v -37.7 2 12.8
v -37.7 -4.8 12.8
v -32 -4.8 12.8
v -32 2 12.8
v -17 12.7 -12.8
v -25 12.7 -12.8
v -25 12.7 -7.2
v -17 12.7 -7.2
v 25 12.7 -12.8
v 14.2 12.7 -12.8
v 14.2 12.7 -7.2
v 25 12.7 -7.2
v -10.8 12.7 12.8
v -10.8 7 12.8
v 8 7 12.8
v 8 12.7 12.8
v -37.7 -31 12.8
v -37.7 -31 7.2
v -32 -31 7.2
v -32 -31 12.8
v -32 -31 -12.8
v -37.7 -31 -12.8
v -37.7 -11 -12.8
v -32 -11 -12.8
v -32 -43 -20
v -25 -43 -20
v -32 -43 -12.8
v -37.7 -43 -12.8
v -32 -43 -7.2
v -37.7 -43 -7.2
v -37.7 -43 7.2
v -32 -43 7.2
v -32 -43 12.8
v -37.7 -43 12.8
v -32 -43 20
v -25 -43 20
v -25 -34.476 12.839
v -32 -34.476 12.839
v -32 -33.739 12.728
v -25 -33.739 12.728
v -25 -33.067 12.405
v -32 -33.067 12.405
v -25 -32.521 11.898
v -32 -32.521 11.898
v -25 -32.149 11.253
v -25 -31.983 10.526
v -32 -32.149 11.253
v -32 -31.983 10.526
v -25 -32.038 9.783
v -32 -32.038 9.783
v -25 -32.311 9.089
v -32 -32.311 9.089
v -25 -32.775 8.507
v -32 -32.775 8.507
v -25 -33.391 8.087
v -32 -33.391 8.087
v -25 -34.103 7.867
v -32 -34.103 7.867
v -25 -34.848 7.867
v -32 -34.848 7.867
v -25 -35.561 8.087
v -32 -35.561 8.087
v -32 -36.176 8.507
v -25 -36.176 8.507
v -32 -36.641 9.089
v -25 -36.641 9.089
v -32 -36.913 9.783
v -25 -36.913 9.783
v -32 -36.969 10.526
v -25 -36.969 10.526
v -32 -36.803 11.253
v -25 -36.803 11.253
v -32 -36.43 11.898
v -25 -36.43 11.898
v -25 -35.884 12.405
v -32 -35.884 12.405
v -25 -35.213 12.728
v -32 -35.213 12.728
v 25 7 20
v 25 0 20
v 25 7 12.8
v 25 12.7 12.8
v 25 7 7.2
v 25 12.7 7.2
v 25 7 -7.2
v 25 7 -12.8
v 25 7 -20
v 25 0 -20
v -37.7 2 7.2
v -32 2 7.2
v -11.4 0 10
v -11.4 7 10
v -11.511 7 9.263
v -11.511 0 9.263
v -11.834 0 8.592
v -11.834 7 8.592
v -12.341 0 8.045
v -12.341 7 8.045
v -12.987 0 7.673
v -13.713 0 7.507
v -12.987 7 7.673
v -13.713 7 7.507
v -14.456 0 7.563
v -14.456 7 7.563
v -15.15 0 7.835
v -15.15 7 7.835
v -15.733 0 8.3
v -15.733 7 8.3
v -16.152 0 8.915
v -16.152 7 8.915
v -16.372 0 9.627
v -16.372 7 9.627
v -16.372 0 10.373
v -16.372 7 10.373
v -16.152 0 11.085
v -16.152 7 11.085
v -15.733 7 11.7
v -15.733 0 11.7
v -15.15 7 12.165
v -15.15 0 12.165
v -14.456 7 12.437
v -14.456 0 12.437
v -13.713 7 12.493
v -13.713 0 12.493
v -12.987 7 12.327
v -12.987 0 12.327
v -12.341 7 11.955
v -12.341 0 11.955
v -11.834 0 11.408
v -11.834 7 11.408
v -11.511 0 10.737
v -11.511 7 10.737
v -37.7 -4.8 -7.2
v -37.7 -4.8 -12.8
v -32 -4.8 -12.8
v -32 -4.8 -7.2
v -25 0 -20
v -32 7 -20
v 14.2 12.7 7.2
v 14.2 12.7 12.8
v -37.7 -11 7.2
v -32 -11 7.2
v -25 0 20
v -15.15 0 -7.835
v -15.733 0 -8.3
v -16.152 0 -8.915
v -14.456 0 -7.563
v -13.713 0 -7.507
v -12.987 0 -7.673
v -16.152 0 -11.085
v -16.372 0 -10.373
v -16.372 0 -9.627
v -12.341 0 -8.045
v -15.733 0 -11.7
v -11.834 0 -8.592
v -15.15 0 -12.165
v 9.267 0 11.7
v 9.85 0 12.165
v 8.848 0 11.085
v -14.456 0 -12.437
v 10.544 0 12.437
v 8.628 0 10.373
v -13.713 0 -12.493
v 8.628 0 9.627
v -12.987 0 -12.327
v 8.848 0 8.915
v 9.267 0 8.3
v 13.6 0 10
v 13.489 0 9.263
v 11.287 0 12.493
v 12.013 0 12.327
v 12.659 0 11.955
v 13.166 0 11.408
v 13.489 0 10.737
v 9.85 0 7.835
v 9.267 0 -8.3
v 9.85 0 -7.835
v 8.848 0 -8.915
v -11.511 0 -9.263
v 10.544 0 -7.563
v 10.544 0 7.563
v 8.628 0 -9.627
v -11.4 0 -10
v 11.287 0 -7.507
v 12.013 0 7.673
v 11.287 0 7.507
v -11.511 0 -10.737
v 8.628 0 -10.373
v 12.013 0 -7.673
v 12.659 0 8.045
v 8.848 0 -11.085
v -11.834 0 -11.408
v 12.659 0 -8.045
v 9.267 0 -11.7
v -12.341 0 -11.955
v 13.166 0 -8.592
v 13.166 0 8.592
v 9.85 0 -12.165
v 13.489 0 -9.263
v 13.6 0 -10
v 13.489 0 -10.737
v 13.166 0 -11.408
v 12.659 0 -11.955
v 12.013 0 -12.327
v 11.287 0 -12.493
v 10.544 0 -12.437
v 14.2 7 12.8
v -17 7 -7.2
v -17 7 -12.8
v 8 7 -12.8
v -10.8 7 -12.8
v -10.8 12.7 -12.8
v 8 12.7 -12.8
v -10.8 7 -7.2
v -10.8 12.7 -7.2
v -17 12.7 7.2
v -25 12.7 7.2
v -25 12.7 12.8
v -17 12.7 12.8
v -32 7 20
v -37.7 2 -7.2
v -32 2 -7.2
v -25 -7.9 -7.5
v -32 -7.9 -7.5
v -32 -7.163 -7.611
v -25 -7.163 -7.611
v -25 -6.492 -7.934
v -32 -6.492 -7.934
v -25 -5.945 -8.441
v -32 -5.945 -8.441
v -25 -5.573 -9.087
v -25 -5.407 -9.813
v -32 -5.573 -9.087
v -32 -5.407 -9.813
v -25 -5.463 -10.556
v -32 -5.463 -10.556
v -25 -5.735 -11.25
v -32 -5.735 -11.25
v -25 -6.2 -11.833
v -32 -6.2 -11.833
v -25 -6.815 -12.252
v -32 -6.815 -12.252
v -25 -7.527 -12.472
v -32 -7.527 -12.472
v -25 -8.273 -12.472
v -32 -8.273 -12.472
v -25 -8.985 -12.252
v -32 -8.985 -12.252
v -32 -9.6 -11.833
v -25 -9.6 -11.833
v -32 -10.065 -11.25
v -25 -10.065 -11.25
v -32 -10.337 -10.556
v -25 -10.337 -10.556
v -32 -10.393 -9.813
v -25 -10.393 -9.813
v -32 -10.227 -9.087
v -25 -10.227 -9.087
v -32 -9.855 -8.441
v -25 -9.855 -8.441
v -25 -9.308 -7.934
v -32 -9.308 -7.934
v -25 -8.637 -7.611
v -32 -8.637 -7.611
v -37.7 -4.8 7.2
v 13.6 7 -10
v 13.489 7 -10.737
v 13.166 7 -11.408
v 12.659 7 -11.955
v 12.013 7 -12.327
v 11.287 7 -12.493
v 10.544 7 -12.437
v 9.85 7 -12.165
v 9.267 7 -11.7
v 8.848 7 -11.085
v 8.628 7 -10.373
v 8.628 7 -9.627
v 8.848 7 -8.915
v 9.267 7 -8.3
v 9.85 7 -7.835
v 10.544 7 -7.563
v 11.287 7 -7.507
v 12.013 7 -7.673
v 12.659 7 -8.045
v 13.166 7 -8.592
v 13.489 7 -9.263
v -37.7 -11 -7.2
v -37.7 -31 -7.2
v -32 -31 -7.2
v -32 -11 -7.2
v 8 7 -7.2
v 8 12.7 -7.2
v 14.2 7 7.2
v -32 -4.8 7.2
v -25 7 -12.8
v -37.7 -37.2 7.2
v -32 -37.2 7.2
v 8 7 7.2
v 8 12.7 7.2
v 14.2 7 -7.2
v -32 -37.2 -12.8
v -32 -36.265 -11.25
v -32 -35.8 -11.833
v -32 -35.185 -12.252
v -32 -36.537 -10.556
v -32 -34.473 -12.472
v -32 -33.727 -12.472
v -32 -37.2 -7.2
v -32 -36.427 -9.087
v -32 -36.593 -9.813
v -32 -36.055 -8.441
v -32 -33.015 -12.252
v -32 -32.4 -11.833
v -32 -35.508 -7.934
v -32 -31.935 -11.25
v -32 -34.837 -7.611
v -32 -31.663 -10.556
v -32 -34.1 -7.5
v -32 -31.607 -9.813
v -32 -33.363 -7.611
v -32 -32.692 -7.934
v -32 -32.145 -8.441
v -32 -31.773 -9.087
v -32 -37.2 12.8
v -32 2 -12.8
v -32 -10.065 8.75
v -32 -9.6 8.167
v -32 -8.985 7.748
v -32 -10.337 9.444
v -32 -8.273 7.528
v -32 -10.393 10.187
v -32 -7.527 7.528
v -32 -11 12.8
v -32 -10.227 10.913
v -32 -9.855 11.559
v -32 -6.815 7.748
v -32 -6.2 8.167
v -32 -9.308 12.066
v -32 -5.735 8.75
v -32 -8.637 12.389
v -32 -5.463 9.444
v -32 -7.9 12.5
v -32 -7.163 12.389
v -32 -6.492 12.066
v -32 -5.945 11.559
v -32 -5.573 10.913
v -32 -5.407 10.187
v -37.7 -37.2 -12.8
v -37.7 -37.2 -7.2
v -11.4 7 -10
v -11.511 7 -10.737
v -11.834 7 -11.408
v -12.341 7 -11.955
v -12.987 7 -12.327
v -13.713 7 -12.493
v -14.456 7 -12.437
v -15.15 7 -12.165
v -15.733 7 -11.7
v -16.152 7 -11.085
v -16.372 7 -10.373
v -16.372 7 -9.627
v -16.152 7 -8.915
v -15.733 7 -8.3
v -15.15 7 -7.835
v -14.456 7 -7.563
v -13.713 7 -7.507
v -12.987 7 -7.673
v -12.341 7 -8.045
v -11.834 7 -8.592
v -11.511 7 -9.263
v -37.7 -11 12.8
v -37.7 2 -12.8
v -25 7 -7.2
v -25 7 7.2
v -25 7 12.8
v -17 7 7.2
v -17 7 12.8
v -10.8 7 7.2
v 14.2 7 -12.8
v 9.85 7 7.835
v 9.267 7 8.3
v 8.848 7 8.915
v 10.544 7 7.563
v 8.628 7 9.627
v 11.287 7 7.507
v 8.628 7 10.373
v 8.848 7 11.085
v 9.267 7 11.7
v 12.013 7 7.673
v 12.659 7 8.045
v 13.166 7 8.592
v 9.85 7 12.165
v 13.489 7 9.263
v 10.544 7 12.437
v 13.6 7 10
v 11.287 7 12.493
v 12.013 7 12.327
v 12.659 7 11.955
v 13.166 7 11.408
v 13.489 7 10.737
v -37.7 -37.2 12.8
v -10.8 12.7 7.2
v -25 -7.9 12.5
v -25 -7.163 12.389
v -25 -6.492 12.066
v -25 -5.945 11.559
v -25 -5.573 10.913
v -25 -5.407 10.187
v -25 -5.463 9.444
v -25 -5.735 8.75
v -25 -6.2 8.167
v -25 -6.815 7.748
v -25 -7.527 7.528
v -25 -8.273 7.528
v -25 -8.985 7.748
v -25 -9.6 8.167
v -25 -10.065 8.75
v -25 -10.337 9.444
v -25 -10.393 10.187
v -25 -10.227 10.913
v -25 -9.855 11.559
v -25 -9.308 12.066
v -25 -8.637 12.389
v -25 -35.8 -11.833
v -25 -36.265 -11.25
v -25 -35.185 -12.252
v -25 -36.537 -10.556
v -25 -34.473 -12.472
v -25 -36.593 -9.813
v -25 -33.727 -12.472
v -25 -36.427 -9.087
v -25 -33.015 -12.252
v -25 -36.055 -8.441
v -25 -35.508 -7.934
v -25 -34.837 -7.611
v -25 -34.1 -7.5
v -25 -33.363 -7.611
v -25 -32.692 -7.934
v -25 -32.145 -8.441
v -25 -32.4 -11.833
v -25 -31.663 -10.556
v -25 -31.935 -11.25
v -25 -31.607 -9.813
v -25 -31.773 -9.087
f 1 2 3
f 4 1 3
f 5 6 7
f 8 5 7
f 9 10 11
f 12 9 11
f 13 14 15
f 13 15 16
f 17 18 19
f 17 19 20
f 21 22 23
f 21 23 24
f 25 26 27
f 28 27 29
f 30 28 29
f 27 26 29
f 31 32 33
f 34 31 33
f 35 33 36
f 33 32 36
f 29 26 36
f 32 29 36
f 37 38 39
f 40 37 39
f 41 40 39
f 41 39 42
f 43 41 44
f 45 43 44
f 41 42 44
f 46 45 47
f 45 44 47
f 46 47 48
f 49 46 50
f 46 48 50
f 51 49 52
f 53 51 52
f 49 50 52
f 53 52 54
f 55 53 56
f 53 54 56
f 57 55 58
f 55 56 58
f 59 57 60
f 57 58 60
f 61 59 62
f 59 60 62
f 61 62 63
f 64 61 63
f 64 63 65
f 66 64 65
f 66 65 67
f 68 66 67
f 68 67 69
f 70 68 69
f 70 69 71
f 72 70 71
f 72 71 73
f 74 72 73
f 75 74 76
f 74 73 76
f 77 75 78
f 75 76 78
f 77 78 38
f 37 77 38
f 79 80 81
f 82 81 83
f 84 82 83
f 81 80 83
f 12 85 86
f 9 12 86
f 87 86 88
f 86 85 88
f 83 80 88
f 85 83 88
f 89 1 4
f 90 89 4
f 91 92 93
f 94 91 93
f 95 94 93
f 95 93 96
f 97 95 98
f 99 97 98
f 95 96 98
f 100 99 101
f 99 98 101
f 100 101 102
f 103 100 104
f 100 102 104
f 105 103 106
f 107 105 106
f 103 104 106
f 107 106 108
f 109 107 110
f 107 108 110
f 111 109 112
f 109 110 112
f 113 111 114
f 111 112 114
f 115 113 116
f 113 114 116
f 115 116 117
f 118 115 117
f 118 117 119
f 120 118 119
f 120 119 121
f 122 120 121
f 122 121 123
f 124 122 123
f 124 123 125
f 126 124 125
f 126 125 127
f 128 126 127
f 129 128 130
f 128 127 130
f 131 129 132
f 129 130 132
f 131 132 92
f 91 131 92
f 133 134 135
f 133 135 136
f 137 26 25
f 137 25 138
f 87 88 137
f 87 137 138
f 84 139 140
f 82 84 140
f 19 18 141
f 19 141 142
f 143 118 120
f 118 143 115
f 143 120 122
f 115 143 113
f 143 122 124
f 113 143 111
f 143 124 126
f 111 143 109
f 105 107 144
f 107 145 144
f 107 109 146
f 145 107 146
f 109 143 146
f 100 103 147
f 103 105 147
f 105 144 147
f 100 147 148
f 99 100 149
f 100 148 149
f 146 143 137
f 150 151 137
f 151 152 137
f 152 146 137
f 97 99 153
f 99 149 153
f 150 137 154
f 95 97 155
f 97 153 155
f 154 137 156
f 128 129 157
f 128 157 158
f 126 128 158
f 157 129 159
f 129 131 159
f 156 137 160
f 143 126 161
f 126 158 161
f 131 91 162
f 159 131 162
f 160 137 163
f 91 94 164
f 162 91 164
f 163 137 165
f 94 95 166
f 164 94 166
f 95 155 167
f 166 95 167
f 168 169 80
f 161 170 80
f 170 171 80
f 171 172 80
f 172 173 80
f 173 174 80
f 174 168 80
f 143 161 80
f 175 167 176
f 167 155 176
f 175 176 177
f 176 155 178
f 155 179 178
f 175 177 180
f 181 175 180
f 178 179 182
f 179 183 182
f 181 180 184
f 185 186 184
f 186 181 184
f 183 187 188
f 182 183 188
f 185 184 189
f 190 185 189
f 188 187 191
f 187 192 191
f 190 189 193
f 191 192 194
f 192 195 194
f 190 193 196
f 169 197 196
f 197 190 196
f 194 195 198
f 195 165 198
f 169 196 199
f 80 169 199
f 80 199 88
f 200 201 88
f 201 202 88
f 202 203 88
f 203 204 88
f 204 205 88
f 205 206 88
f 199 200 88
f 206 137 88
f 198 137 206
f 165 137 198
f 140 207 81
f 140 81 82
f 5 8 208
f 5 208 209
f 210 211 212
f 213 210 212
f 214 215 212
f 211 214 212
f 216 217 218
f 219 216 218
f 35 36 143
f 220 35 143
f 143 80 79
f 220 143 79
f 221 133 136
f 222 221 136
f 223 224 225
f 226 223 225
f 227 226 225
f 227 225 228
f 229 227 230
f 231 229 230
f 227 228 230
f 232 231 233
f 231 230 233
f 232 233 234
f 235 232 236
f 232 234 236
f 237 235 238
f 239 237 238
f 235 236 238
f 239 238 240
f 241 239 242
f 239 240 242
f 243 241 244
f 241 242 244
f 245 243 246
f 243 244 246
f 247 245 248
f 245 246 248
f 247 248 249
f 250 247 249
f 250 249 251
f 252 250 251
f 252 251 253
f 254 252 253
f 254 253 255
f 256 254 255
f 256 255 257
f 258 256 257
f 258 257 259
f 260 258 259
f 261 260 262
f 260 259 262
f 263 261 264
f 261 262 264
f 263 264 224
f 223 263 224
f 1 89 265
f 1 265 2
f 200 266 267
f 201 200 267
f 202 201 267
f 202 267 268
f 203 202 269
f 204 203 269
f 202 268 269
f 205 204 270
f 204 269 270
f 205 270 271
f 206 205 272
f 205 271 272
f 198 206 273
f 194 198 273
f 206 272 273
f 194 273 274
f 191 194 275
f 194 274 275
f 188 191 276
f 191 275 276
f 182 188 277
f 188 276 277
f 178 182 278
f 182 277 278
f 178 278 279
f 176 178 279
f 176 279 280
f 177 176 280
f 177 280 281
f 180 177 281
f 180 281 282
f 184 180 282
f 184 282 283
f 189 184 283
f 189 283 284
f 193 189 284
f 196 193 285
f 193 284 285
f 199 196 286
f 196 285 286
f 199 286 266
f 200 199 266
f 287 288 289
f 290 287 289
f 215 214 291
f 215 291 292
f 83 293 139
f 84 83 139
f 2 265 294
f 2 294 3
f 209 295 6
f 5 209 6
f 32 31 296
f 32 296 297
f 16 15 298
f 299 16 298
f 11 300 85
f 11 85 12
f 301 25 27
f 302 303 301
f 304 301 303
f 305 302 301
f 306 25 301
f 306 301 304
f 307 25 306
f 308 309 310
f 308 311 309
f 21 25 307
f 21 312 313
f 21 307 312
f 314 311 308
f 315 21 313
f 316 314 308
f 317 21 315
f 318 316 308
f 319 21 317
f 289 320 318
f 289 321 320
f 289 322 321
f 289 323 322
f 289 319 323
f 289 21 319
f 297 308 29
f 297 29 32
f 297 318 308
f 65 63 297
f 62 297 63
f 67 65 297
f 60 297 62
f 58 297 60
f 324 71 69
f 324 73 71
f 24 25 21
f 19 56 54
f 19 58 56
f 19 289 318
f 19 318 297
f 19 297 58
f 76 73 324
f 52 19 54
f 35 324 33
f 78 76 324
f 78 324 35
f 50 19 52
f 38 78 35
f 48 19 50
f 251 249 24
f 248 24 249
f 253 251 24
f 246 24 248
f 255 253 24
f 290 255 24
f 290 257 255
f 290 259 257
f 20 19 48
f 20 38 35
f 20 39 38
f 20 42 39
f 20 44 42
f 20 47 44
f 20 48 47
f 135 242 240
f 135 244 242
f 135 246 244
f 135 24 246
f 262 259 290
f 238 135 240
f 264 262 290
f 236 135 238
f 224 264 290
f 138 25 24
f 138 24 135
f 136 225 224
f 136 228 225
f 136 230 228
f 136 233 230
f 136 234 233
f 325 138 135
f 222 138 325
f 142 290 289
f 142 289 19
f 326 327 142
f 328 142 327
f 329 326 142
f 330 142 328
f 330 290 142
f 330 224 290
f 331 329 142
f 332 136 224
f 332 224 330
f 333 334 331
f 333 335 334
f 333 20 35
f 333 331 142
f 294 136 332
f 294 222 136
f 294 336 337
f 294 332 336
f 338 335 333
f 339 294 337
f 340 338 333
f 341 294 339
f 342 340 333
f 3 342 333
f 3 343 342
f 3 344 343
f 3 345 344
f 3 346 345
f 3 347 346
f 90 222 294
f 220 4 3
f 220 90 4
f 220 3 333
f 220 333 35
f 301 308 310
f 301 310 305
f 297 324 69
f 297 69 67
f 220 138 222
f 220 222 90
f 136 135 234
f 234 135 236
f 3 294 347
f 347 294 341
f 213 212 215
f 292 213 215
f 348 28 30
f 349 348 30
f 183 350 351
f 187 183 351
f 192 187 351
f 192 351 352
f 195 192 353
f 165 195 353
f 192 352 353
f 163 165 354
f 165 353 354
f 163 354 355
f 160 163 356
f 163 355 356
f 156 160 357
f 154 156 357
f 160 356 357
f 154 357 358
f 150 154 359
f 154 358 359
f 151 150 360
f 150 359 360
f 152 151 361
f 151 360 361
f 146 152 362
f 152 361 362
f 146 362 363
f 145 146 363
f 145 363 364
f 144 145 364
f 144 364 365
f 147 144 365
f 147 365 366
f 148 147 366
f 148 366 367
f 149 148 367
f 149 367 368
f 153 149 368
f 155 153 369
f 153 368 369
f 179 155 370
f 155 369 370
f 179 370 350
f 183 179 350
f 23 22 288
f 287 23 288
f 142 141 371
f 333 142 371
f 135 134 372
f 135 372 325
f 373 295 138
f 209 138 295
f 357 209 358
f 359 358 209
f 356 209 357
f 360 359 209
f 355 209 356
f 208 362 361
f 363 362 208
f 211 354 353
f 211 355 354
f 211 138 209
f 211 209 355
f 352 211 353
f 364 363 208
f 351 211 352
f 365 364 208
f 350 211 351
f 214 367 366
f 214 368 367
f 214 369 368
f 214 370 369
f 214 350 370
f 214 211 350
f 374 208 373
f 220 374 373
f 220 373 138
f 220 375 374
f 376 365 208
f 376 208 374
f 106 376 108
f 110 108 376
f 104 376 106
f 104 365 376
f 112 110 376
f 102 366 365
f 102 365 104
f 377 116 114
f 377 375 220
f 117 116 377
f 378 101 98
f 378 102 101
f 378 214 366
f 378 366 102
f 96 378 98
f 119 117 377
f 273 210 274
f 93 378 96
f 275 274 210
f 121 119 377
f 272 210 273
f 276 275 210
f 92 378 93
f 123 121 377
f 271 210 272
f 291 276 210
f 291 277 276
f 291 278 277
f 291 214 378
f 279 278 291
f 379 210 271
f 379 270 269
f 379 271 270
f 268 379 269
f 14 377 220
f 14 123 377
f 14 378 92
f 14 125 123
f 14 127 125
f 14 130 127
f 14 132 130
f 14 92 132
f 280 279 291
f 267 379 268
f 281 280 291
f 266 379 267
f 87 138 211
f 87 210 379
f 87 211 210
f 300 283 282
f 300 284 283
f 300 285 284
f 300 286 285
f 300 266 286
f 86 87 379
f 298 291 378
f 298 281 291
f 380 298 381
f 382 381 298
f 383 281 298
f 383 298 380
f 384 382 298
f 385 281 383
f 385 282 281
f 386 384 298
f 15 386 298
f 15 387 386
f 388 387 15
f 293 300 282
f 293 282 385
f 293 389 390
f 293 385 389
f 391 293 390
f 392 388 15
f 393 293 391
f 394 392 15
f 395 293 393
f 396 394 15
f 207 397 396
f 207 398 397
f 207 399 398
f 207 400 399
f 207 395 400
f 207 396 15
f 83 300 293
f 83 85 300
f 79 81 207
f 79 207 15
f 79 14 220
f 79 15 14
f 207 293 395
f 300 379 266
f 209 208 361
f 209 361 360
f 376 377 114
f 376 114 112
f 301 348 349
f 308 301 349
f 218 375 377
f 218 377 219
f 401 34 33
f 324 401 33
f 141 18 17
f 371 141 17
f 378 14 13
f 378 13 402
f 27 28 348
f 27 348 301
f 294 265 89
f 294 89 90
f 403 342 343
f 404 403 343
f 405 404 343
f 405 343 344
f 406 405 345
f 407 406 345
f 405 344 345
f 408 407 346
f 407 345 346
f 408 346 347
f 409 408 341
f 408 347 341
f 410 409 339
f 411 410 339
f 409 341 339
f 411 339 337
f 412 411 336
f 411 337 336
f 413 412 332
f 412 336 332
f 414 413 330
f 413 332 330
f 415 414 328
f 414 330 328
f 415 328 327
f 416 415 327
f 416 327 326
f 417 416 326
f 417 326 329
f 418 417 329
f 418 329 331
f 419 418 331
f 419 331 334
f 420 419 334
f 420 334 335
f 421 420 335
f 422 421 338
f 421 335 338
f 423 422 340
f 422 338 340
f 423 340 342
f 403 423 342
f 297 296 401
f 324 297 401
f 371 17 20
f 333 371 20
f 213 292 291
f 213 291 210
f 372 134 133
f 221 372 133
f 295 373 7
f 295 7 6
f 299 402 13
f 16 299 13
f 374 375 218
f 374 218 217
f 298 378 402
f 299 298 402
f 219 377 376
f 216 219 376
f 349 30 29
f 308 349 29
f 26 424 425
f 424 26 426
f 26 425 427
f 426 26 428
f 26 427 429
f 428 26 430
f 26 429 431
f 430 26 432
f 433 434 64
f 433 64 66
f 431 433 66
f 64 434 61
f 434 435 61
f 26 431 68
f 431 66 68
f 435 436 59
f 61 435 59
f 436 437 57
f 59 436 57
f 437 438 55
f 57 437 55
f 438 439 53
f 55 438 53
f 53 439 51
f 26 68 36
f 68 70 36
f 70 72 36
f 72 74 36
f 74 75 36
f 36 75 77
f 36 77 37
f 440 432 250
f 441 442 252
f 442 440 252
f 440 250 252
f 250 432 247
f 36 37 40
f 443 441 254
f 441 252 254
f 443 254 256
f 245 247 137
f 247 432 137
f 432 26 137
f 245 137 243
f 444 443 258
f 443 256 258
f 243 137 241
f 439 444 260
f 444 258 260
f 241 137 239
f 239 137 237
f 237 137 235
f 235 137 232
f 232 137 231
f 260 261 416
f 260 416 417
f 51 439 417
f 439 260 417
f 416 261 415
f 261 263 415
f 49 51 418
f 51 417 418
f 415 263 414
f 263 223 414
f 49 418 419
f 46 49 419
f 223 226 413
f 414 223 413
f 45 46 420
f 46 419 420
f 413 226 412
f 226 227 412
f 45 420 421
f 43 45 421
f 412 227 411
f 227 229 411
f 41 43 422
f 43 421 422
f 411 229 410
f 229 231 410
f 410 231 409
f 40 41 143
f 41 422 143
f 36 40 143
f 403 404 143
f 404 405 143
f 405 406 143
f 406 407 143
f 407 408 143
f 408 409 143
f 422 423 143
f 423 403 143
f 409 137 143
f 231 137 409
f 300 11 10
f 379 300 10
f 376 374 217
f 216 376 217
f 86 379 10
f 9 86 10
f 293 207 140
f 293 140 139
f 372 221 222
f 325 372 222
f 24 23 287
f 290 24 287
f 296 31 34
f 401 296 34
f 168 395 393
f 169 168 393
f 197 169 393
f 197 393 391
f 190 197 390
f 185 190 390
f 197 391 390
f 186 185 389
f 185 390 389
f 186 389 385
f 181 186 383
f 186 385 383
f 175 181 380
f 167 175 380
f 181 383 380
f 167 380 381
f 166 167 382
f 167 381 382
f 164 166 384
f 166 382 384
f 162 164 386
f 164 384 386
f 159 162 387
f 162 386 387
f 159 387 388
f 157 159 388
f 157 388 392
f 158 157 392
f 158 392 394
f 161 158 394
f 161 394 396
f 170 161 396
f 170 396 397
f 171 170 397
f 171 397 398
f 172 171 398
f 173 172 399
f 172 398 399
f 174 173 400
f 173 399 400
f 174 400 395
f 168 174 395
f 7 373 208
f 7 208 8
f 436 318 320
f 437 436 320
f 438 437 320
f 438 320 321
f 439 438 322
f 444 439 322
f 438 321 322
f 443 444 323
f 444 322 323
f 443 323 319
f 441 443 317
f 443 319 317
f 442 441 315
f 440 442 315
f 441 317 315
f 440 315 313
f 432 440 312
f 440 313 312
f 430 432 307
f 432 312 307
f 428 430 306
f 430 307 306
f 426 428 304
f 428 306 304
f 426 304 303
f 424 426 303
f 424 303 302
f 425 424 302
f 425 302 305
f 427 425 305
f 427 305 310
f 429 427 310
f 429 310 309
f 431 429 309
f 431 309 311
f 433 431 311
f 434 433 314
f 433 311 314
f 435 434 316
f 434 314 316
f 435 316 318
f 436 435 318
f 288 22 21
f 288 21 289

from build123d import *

# Parameters (mm, degrees)
CROQUIS1_W              = 50
CROQUIS1_H              = 40
SALIENTE_EXTRUIR1_DEPTH = 7
CROQUIS3_W              = 5.6
CROQUIS3_H              = 5.7
SALIENTE_EXTRUIR3_DEPTH = 50
CROQUIS9_W              = 40
CROQUIS9_H              = 50
SALIENTE_EXTRUIR8_DEPTH = 7
CROQUIS10_W             = 5.7
CROQUIS10_H             = 5.6
SALIENTE_EXTRUIR9_DEPTH = 45
CROQUIS18_W             = 40
CROQUIS18_H             = 6.2
CORTAR_EXTRUIR4_DEPTH   = 5.7
CROQUIS19_W             = 6.2
CROQUIS19_H             = 40
CORTAR_EXTRUIR5_DEPTH   = 5.7
CROQUIS20_R             = 2.5
CORTAR_EXTRUIR6_DEPTH   = 7
CROQUIS21_R             = 2.5
CORTAR_EXTRUIR7_DEPTH   = 7


with BuildPart() as part:
    # Croquis1 → Saliente-Extruir1 (new body)
    with BuildSketch(Plane(origin=(0, 0, 0), x_dir=(1, 0, 0), z_dir=(0, 1, 0))):
        Rectangle(CROQUIS1_W, CROQUIS1_H)
    extrude(amount=SALIENTE_EXTRUIR1_DEPTH)

    # Croquis3 → Saliente-Extruir3 (add)
    with BuildSketch(Plane.ZY.offset(25)):
        with Locations((10, 9.85)):
            Rectangle(CROQUIS3_W, CROQUIS3_H)
        with Locations((-10, 9.85)):
            Rectangle(CROQUIS3_W, CROQUIS3_H)
    extrude(amount=-SALIENTE_EXTRUIR3_DEPTH)

    # Croquis9 → Saliente-Extruir8 (add)
    with BuildSketch(Plane.ZY.offset(25)):
        with Locations((0, -18)):
            Rectangle(CROQUIS9_W, CROQUIS9_H)
    extrude(amount=SALIENTE_EXTRUIR8_DEPTH)

    # Croquis10 → Saliente-Extruir9 (add)
    with BuildSketch(Plane.XZ.offset(43)):
        with Locations((-34.85, 10)):
            Rectangle(CROQUIS10_W, CROQUIS10_H)
        with Locations((-34.85, -10)):
            Rectangle(CROQUIS10_W, CROQUIS10_H)
    extrude(amount=-SALIENTE_EXTRUIR9_DEPTH)

    # Croquis18 → Cortar-Extruir4 (cut)
    with BuildSketch(Plane.ZY.offset(37.7)):
        with Locations((0, -34.1)):
            Rectangle(CROQUIS18_W, CROQUIS18_H)
        with Locations((0, -7.9)):
            Rectangle(CROQUIS18_W, CROQUIS18_H)
    extrude(amount=-CORTAR_EXTRUIR4_DEPTH, mode=Mode.SUBTRACT)

    # Croquis19 → Cortar-Extruir5 (cut)
    with BuildSketch(Plane(origin=(0, 12.7, 0), x_dir=(1, 0, 0), z_dir=(0, 1, 0))):
        with Locations((-13.9, 0)):
            Rectangle(CROQUIS19_W, CROQUIS19_H)
        with Locations((11.1, 0)):
            Rectangle(CROQUIS19_W, CROQUIS19_H)
    extrude(amount=-CORTAR_EXTRUIR5_DEPTH, mode=Mode.SUBTRACT)

    # Croquis20 → Cortar-Extruir6 (cut)
    with BuildSketch(Plane(origin=(0, 7, 0), x_dir=(1, 0, 0), z_dir=(0, 1, 0))):
        with Locations((-13.9, 10)):
            Circle(CROQUIS20_R)
        with Locations((11.1, 10)):
            Circle(CROQUIS20_R)
        with Locations((11.1, -10)):
            Circle(CROQUIS20_R)
        with Locations((-13.9, -10)):
            Circle(CROQUIS20_R)
    extrude(amount=-CORTAR_EXTRUIR6_DEPTH, mode=Mode.SUBTRACT)

    # Croquis21 → Cortar-Extruir7 (cut)
    with BuildSketch(Plane.ZY.offset(32)):
        with Locations((-10, -7.9)):
            Circle(CROQUIS21_R)
        with Locations((10, -7.9)):
            Circle(CROQUIS21_R)
        with Locations((10.339424261, -34.475791146)):
            Circle(CROQUIS21_R)
        with Locations((-10, -34.1)):
            Circle(CROQUIS21_R)
    extrude(amount=-CORTAR_EXTRUIR7_DEPTH, mode=Mode.SUBTRACT)


solid = part.part
